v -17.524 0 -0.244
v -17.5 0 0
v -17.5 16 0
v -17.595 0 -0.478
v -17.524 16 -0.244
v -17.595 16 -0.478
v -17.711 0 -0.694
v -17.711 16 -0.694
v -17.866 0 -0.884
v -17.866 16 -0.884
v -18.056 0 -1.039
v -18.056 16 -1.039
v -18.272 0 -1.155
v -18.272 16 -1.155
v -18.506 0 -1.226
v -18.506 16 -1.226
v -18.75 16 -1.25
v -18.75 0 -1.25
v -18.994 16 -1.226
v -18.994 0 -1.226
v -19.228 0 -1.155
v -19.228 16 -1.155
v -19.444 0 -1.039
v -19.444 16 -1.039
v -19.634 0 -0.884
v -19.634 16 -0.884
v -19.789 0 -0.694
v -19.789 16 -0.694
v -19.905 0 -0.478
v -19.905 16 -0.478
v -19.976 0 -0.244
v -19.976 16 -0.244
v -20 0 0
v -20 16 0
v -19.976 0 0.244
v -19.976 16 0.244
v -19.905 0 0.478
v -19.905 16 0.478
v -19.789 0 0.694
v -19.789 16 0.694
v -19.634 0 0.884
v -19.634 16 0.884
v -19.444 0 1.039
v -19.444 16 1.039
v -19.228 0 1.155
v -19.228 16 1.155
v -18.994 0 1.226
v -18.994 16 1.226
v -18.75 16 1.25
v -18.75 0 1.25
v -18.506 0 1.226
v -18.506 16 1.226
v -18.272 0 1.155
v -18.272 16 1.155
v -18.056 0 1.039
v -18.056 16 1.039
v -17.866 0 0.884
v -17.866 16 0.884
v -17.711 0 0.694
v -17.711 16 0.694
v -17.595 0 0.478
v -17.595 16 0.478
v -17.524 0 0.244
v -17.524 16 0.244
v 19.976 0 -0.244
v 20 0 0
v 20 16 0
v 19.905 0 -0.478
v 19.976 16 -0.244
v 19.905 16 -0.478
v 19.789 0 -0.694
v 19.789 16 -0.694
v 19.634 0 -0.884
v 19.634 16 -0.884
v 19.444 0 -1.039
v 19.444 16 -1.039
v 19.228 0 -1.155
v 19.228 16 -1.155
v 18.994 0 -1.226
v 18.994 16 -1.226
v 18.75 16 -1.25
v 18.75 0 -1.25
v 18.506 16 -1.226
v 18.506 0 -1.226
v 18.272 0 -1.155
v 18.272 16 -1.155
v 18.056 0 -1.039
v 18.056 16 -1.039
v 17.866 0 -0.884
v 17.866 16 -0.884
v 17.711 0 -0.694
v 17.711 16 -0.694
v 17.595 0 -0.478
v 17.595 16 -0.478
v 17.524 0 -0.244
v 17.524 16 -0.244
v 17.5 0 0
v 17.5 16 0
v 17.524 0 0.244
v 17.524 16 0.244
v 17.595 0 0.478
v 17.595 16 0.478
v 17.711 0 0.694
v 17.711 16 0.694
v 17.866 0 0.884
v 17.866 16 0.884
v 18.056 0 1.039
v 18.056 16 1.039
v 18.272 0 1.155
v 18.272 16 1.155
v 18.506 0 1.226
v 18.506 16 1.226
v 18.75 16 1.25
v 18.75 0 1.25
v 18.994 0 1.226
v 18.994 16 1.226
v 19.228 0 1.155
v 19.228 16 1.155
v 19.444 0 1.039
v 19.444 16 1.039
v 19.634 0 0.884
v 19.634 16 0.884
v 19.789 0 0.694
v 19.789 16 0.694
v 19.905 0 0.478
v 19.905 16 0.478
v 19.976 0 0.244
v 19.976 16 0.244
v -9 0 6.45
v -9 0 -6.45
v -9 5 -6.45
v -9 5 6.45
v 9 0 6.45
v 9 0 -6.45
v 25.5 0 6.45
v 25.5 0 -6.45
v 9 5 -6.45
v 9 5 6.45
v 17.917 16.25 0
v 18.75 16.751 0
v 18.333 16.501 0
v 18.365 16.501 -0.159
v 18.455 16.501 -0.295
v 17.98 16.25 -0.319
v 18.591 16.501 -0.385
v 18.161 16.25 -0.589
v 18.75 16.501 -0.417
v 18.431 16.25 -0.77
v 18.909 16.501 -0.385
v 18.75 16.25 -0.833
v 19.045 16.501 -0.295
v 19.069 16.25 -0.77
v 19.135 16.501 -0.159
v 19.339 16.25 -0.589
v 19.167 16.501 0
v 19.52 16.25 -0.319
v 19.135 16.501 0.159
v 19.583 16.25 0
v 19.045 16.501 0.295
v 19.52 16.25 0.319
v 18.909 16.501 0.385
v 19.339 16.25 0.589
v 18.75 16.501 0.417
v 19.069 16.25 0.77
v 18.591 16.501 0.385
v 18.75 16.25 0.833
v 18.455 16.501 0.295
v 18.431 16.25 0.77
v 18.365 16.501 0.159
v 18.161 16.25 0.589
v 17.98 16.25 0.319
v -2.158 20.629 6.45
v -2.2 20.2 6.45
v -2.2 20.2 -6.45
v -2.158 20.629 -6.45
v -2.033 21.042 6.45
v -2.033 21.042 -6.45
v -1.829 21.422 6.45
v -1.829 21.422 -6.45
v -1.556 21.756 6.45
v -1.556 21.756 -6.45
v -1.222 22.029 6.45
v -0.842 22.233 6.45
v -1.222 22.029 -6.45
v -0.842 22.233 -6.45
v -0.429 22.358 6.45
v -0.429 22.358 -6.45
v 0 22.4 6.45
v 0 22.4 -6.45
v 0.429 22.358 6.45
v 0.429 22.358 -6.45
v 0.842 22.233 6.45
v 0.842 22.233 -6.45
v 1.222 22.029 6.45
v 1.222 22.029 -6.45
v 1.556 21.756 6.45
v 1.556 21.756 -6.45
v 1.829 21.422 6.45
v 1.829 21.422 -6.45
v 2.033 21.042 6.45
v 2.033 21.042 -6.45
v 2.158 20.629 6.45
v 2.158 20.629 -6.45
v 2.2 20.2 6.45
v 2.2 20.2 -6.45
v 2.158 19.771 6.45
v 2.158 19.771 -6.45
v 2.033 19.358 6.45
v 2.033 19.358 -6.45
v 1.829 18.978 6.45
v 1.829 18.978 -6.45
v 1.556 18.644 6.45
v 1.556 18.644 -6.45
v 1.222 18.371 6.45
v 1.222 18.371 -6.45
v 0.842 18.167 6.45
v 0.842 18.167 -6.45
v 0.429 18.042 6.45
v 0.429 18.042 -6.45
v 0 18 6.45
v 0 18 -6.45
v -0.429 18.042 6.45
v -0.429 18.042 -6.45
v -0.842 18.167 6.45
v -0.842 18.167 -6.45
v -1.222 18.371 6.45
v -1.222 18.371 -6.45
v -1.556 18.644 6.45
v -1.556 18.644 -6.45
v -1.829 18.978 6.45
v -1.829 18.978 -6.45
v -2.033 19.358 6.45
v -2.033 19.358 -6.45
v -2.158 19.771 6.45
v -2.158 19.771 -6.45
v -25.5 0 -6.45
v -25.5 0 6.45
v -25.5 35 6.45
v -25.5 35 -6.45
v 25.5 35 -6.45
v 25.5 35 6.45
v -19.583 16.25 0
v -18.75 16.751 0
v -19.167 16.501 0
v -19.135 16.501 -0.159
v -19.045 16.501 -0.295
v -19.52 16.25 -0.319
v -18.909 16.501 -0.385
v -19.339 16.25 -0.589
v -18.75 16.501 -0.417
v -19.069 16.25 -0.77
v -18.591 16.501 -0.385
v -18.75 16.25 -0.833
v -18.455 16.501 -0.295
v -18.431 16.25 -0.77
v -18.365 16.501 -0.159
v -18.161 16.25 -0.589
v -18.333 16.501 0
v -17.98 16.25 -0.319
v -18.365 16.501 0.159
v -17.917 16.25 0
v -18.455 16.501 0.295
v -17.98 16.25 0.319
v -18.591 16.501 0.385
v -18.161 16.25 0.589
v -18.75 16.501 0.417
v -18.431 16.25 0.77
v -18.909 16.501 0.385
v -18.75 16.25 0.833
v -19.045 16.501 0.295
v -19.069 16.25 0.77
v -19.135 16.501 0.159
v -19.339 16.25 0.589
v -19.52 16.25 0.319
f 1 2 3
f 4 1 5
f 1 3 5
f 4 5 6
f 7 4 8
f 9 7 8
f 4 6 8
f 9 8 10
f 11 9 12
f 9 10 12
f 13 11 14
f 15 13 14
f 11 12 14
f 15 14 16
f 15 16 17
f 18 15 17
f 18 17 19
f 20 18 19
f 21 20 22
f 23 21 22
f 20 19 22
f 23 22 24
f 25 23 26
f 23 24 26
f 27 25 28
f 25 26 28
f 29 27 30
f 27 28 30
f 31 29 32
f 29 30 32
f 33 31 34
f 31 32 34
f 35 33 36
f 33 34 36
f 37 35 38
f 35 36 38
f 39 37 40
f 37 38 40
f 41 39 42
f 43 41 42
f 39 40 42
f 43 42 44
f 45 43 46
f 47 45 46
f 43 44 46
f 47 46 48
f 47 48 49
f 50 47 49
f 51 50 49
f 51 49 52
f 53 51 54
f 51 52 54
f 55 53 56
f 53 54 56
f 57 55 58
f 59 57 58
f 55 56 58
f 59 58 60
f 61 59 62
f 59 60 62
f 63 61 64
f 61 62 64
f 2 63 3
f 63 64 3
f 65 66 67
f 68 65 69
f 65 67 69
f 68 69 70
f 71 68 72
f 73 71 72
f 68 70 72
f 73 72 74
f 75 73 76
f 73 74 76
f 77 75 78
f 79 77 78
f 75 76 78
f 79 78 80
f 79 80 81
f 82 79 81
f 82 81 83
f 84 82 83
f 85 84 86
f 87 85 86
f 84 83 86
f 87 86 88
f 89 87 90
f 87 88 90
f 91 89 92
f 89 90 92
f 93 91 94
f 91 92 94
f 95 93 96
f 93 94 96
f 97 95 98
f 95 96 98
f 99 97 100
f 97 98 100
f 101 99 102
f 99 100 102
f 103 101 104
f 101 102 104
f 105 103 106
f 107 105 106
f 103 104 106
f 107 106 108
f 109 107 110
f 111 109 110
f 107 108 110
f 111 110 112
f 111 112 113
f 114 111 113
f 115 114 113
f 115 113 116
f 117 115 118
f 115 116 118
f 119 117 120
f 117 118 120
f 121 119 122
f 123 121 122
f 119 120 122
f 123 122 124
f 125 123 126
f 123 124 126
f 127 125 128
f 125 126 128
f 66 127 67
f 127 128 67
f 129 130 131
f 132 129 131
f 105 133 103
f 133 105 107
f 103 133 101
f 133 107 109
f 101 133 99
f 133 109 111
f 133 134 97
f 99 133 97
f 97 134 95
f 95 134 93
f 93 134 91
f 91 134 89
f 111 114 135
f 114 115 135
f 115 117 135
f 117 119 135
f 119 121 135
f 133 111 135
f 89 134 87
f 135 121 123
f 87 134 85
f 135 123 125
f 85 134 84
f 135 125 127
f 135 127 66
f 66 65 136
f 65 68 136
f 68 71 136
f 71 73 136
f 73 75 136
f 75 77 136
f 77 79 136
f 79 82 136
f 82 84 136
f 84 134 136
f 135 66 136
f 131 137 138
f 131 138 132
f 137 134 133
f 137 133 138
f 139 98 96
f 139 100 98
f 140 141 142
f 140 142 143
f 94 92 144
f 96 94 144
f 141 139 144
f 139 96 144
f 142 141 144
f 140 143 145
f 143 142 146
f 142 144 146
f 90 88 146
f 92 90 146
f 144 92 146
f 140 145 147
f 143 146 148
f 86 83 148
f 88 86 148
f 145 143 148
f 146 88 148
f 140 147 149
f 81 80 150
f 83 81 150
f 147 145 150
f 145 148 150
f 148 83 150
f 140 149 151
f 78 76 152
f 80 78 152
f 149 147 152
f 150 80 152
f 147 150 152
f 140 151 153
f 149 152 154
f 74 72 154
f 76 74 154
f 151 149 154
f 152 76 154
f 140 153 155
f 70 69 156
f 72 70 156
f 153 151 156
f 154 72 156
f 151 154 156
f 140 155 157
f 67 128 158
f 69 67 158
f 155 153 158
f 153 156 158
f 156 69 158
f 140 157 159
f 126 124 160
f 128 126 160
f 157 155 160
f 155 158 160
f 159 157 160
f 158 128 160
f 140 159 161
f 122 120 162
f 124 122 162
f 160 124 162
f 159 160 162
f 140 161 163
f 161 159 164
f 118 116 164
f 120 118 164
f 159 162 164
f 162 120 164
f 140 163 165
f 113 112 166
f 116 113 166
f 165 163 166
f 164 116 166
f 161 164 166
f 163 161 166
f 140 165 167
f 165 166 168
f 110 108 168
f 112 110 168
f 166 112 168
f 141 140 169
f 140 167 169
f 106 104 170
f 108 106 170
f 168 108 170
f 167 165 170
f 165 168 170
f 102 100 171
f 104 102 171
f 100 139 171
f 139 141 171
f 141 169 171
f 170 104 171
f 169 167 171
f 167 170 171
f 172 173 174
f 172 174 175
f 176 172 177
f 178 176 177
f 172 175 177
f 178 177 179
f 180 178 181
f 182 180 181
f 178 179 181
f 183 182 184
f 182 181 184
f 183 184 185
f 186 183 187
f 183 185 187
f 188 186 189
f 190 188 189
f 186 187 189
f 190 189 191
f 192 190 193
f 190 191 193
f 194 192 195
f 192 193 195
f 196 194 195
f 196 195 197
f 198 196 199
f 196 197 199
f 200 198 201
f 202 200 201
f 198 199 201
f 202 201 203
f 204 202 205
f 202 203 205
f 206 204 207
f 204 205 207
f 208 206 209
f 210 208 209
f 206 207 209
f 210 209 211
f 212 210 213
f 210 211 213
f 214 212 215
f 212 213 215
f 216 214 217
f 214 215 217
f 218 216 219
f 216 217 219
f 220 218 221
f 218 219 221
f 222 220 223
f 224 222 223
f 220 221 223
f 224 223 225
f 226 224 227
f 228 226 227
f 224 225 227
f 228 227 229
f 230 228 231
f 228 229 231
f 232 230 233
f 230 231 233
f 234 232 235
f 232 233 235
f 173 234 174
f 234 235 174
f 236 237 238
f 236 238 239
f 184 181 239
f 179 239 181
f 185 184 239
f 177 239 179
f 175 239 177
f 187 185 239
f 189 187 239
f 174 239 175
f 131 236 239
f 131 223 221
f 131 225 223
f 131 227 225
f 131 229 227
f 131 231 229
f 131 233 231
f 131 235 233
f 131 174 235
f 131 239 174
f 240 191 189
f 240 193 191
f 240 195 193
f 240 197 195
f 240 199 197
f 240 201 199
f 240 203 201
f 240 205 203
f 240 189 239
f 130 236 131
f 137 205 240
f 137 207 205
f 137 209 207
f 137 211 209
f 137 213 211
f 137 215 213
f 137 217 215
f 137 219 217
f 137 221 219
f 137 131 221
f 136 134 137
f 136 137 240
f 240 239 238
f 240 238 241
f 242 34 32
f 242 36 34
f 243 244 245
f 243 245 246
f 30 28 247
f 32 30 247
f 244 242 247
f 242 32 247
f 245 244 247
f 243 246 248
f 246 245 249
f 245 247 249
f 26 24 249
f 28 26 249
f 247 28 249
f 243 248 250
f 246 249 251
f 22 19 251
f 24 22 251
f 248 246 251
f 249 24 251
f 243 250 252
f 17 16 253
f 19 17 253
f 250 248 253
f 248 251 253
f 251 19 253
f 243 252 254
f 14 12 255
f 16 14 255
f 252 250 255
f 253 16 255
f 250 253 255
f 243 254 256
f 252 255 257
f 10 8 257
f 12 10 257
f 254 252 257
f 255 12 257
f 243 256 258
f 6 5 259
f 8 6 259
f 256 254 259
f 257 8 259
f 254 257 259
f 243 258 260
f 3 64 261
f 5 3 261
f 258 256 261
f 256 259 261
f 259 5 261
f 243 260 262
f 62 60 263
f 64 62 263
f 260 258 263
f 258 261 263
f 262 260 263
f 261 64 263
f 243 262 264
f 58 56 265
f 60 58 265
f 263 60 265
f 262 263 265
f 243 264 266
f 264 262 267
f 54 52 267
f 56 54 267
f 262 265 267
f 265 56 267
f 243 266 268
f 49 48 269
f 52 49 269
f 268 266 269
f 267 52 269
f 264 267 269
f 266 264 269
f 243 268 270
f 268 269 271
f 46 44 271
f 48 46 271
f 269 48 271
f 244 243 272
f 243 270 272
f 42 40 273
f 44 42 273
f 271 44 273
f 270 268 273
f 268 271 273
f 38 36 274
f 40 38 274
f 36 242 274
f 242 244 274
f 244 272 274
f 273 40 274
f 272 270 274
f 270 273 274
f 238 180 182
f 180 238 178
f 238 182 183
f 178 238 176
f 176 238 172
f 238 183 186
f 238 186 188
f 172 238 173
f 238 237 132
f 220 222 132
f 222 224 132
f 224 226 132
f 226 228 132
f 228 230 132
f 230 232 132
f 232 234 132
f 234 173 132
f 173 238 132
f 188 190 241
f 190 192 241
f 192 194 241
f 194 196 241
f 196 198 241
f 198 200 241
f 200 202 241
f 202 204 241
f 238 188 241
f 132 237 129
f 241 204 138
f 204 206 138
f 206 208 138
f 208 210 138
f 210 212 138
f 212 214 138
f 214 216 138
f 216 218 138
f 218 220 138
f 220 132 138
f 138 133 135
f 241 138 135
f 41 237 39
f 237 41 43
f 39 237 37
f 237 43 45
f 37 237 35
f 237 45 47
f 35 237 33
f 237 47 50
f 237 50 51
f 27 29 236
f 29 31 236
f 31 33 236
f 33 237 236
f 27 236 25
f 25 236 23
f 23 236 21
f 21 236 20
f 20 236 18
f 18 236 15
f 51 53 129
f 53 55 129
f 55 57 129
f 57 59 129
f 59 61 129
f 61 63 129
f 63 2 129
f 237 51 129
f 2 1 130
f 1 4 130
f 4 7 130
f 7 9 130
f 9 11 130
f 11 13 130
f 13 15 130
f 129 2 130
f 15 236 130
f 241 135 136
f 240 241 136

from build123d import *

# Parameters (mm, degrees)
SKETCH2_W                 = 51
SKETCH2_H                 = 12.9
BOSS_EXTRUDE1_DEPTH       = 35
M3X0_5_TAPPED_HOLE1_D     = 2.5
M3X0_5_TAPPED_HOLE1_DEPTH = 16
M3X0_5_TAPPED_HOLE1_TIP   = 0.751075774
SKETCH5_R                 = 2.2
SKETCH5_W                 = 18
SKETCH5_H                 = 5
CUT_EXTRUDE1_DEPTH        = 12.9


with BuildPart() as part:
    # Sketch2 → Boss-Extrude1 (new body)
    with BuildSketch(Plane(origin=(0, 0, 0), x_dir=(1, 0, 0), z_dir=(0, 1, 0))):
        Rectangle(SKETCH2_W, SKETCH2_H)
    extrude(amount=BOSS_EXTRUDE1_DEPTH)

    # M3x0.5 Tapped Hole1
    with Locations(Plane(origin=(0, 0, 0), x_dir=(-1, 0, 0), z_dir=(0, -1, 0))):
        with Locations((-18.75, 0), (18.75, 0)):
            Hole(M3X0_5_TAPPED_HOLE1_D / 2, depth=M3X0_5_TAPPED_HOLE1_DEPTH)
            with Locations((0, 0, -(M3X0_5_TAPPED_HOLE1_DEPTH + M3X0_5_TAPPED_HOLE1_TIP / 2))):  # 118° drill point
                Cone(0, M3X0_5_TAPPED_HOLE1_D / 2, M3X0_5_TAPPED_HOLE1_TIP, mode=Mode.SUBTRACT)

    # Sketch5 → Cut-Extrude1 (cut)
    with BuildSketch(Plane(origin=(0, 0, -6.45), x_dir=(-1, 0, 0), z_dir=(0, 0, -1))):
        with Locations((0, 20.2)):
            Circle(SKETCH5_R)
        with Locations((0, 2.5)):
            Rectangle(SKETCH5_W, SKETCH5_H)
    extrude(amount=-CUT_EXTRUDE1_DEPTH, mode=Mode.SUBTRACT)


solid = part.part
